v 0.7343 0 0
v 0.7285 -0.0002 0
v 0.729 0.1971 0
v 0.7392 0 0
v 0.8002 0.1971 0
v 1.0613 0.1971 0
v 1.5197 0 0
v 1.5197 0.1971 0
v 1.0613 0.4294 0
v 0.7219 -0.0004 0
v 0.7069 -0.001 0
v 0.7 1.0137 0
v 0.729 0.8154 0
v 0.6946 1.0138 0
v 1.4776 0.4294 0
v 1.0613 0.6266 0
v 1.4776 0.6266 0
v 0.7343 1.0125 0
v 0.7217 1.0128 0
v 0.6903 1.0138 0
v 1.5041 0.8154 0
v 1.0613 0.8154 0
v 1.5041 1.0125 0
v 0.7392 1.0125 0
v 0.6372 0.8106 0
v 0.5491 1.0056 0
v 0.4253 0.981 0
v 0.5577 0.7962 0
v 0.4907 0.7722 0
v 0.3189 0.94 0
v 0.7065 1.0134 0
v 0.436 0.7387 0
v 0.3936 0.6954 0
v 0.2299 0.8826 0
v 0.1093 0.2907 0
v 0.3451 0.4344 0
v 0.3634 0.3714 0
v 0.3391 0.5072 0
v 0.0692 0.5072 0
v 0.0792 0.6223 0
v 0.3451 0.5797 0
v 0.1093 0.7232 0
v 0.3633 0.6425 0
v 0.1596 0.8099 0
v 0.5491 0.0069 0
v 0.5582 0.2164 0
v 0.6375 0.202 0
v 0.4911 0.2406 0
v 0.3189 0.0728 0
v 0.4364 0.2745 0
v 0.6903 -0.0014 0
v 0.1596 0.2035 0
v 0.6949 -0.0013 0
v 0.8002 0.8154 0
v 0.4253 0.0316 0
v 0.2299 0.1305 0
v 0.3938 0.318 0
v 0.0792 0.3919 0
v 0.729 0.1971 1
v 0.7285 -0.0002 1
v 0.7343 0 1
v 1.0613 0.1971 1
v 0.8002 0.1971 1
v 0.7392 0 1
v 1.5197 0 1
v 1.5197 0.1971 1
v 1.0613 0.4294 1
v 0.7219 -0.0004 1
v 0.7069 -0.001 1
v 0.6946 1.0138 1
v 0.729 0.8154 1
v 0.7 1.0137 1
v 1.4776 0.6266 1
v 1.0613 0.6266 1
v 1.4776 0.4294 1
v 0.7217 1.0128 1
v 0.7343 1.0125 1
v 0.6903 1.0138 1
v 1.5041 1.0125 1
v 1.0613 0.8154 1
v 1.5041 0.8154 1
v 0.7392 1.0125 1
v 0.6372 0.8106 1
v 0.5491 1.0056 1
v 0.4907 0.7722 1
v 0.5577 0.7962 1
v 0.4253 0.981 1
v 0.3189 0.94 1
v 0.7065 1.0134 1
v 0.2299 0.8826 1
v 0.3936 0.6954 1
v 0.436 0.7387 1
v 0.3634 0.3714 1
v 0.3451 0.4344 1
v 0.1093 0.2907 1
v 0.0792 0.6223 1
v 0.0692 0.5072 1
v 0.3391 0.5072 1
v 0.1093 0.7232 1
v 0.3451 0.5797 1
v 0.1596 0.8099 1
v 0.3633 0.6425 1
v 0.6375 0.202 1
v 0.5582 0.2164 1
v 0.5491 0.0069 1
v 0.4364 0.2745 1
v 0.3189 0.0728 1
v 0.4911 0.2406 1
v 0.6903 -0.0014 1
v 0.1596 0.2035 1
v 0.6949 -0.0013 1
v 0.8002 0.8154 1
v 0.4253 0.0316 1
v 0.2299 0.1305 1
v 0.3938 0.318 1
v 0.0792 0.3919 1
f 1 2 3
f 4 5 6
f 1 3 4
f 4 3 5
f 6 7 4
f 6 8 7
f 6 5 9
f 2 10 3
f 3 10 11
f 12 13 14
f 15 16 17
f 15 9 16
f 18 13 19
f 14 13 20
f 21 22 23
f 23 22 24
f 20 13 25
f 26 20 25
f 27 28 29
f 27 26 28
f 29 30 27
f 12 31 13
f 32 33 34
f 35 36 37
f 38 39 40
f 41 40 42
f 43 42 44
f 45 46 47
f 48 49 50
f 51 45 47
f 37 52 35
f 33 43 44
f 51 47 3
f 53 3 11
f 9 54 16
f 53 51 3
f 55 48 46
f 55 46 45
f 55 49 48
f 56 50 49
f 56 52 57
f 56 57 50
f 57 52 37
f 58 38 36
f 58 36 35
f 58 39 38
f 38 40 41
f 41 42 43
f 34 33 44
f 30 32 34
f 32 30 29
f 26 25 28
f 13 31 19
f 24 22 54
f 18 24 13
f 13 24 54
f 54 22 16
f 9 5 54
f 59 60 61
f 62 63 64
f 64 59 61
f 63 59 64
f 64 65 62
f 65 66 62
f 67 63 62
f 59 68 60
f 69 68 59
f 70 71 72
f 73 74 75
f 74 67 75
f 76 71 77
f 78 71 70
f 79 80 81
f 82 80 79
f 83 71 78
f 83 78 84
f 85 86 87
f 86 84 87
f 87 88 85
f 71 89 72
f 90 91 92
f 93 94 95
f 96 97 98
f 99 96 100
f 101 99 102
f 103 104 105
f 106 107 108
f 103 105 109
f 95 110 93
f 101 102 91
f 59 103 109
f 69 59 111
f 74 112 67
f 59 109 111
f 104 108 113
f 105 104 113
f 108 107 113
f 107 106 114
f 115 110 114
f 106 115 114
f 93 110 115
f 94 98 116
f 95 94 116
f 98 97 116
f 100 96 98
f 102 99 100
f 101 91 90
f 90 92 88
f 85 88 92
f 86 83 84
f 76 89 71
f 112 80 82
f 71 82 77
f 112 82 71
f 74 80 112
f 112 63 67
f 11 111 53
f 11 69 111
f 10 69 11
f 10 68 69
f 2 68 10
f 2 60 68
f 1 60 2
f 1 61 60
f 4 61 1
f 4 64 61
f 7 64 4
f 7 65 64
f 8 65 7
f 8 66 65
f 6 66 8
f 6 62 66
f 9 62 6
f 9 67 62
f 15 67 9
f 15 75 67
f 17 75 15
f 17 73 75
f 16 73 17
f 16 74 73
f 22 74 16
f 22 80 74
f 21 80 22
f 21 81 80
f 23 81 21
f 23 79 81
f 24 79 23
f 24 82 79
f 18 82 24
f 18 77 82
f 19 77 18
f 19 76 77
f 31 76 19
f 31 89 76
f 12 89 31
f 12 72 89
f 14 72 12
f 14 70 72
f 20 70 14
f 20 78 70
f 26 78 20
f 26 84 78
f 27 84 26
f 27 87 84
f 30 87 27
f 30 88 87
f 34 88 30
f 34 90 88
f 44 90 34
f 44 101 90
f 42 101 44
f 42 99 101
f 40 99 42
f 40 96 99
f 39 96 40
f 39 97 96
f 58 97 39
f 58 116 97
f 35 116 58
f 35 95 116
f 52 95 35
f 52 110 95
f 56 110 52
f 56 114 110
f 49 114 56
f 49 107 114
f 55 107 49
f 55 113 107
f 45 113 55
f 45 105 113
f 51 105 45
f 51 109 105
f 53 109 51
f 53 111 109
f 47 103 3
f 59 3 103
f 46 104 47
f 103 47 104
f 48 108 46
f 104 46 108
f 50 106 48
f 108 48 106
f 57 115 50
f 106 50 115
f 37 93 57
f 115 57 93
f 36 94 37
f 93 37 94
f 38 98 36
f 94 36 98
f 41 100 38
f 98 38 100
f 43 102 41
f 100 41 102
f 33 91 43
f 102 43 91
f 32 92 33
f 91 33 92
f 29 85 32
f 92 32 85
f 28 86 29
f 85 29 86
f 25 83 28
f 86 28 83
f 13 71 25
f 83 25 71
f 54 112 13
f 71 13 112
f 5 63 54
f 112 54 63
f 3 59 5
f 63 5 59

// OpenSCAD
//------------------------------------------------------
// Mark
// Simple texte
// 5@xes 04/06/2022
// Size Must be 1x1 !
//------------------------------------------------------

$fn=30;
// font = "Gill Sans MT:style=Bold";
// font = "Roboto:style=Bold";
// font = "Leelawadee:style=Bold";
// font = "Arial Rounded MT Bold:style=Bold";
font = "Gill Sans MT:style=Bold";


letter_height = 1;
letter_size =1;

render() translate([0,0,0]) letter("Œ");


module letter(Txt) {
  color("Red")
  linear_extrude(height = letter_height) {
    text(Txt, size = letter_size, font = font, halign = "left", valign = "baseline");
  }
}                
